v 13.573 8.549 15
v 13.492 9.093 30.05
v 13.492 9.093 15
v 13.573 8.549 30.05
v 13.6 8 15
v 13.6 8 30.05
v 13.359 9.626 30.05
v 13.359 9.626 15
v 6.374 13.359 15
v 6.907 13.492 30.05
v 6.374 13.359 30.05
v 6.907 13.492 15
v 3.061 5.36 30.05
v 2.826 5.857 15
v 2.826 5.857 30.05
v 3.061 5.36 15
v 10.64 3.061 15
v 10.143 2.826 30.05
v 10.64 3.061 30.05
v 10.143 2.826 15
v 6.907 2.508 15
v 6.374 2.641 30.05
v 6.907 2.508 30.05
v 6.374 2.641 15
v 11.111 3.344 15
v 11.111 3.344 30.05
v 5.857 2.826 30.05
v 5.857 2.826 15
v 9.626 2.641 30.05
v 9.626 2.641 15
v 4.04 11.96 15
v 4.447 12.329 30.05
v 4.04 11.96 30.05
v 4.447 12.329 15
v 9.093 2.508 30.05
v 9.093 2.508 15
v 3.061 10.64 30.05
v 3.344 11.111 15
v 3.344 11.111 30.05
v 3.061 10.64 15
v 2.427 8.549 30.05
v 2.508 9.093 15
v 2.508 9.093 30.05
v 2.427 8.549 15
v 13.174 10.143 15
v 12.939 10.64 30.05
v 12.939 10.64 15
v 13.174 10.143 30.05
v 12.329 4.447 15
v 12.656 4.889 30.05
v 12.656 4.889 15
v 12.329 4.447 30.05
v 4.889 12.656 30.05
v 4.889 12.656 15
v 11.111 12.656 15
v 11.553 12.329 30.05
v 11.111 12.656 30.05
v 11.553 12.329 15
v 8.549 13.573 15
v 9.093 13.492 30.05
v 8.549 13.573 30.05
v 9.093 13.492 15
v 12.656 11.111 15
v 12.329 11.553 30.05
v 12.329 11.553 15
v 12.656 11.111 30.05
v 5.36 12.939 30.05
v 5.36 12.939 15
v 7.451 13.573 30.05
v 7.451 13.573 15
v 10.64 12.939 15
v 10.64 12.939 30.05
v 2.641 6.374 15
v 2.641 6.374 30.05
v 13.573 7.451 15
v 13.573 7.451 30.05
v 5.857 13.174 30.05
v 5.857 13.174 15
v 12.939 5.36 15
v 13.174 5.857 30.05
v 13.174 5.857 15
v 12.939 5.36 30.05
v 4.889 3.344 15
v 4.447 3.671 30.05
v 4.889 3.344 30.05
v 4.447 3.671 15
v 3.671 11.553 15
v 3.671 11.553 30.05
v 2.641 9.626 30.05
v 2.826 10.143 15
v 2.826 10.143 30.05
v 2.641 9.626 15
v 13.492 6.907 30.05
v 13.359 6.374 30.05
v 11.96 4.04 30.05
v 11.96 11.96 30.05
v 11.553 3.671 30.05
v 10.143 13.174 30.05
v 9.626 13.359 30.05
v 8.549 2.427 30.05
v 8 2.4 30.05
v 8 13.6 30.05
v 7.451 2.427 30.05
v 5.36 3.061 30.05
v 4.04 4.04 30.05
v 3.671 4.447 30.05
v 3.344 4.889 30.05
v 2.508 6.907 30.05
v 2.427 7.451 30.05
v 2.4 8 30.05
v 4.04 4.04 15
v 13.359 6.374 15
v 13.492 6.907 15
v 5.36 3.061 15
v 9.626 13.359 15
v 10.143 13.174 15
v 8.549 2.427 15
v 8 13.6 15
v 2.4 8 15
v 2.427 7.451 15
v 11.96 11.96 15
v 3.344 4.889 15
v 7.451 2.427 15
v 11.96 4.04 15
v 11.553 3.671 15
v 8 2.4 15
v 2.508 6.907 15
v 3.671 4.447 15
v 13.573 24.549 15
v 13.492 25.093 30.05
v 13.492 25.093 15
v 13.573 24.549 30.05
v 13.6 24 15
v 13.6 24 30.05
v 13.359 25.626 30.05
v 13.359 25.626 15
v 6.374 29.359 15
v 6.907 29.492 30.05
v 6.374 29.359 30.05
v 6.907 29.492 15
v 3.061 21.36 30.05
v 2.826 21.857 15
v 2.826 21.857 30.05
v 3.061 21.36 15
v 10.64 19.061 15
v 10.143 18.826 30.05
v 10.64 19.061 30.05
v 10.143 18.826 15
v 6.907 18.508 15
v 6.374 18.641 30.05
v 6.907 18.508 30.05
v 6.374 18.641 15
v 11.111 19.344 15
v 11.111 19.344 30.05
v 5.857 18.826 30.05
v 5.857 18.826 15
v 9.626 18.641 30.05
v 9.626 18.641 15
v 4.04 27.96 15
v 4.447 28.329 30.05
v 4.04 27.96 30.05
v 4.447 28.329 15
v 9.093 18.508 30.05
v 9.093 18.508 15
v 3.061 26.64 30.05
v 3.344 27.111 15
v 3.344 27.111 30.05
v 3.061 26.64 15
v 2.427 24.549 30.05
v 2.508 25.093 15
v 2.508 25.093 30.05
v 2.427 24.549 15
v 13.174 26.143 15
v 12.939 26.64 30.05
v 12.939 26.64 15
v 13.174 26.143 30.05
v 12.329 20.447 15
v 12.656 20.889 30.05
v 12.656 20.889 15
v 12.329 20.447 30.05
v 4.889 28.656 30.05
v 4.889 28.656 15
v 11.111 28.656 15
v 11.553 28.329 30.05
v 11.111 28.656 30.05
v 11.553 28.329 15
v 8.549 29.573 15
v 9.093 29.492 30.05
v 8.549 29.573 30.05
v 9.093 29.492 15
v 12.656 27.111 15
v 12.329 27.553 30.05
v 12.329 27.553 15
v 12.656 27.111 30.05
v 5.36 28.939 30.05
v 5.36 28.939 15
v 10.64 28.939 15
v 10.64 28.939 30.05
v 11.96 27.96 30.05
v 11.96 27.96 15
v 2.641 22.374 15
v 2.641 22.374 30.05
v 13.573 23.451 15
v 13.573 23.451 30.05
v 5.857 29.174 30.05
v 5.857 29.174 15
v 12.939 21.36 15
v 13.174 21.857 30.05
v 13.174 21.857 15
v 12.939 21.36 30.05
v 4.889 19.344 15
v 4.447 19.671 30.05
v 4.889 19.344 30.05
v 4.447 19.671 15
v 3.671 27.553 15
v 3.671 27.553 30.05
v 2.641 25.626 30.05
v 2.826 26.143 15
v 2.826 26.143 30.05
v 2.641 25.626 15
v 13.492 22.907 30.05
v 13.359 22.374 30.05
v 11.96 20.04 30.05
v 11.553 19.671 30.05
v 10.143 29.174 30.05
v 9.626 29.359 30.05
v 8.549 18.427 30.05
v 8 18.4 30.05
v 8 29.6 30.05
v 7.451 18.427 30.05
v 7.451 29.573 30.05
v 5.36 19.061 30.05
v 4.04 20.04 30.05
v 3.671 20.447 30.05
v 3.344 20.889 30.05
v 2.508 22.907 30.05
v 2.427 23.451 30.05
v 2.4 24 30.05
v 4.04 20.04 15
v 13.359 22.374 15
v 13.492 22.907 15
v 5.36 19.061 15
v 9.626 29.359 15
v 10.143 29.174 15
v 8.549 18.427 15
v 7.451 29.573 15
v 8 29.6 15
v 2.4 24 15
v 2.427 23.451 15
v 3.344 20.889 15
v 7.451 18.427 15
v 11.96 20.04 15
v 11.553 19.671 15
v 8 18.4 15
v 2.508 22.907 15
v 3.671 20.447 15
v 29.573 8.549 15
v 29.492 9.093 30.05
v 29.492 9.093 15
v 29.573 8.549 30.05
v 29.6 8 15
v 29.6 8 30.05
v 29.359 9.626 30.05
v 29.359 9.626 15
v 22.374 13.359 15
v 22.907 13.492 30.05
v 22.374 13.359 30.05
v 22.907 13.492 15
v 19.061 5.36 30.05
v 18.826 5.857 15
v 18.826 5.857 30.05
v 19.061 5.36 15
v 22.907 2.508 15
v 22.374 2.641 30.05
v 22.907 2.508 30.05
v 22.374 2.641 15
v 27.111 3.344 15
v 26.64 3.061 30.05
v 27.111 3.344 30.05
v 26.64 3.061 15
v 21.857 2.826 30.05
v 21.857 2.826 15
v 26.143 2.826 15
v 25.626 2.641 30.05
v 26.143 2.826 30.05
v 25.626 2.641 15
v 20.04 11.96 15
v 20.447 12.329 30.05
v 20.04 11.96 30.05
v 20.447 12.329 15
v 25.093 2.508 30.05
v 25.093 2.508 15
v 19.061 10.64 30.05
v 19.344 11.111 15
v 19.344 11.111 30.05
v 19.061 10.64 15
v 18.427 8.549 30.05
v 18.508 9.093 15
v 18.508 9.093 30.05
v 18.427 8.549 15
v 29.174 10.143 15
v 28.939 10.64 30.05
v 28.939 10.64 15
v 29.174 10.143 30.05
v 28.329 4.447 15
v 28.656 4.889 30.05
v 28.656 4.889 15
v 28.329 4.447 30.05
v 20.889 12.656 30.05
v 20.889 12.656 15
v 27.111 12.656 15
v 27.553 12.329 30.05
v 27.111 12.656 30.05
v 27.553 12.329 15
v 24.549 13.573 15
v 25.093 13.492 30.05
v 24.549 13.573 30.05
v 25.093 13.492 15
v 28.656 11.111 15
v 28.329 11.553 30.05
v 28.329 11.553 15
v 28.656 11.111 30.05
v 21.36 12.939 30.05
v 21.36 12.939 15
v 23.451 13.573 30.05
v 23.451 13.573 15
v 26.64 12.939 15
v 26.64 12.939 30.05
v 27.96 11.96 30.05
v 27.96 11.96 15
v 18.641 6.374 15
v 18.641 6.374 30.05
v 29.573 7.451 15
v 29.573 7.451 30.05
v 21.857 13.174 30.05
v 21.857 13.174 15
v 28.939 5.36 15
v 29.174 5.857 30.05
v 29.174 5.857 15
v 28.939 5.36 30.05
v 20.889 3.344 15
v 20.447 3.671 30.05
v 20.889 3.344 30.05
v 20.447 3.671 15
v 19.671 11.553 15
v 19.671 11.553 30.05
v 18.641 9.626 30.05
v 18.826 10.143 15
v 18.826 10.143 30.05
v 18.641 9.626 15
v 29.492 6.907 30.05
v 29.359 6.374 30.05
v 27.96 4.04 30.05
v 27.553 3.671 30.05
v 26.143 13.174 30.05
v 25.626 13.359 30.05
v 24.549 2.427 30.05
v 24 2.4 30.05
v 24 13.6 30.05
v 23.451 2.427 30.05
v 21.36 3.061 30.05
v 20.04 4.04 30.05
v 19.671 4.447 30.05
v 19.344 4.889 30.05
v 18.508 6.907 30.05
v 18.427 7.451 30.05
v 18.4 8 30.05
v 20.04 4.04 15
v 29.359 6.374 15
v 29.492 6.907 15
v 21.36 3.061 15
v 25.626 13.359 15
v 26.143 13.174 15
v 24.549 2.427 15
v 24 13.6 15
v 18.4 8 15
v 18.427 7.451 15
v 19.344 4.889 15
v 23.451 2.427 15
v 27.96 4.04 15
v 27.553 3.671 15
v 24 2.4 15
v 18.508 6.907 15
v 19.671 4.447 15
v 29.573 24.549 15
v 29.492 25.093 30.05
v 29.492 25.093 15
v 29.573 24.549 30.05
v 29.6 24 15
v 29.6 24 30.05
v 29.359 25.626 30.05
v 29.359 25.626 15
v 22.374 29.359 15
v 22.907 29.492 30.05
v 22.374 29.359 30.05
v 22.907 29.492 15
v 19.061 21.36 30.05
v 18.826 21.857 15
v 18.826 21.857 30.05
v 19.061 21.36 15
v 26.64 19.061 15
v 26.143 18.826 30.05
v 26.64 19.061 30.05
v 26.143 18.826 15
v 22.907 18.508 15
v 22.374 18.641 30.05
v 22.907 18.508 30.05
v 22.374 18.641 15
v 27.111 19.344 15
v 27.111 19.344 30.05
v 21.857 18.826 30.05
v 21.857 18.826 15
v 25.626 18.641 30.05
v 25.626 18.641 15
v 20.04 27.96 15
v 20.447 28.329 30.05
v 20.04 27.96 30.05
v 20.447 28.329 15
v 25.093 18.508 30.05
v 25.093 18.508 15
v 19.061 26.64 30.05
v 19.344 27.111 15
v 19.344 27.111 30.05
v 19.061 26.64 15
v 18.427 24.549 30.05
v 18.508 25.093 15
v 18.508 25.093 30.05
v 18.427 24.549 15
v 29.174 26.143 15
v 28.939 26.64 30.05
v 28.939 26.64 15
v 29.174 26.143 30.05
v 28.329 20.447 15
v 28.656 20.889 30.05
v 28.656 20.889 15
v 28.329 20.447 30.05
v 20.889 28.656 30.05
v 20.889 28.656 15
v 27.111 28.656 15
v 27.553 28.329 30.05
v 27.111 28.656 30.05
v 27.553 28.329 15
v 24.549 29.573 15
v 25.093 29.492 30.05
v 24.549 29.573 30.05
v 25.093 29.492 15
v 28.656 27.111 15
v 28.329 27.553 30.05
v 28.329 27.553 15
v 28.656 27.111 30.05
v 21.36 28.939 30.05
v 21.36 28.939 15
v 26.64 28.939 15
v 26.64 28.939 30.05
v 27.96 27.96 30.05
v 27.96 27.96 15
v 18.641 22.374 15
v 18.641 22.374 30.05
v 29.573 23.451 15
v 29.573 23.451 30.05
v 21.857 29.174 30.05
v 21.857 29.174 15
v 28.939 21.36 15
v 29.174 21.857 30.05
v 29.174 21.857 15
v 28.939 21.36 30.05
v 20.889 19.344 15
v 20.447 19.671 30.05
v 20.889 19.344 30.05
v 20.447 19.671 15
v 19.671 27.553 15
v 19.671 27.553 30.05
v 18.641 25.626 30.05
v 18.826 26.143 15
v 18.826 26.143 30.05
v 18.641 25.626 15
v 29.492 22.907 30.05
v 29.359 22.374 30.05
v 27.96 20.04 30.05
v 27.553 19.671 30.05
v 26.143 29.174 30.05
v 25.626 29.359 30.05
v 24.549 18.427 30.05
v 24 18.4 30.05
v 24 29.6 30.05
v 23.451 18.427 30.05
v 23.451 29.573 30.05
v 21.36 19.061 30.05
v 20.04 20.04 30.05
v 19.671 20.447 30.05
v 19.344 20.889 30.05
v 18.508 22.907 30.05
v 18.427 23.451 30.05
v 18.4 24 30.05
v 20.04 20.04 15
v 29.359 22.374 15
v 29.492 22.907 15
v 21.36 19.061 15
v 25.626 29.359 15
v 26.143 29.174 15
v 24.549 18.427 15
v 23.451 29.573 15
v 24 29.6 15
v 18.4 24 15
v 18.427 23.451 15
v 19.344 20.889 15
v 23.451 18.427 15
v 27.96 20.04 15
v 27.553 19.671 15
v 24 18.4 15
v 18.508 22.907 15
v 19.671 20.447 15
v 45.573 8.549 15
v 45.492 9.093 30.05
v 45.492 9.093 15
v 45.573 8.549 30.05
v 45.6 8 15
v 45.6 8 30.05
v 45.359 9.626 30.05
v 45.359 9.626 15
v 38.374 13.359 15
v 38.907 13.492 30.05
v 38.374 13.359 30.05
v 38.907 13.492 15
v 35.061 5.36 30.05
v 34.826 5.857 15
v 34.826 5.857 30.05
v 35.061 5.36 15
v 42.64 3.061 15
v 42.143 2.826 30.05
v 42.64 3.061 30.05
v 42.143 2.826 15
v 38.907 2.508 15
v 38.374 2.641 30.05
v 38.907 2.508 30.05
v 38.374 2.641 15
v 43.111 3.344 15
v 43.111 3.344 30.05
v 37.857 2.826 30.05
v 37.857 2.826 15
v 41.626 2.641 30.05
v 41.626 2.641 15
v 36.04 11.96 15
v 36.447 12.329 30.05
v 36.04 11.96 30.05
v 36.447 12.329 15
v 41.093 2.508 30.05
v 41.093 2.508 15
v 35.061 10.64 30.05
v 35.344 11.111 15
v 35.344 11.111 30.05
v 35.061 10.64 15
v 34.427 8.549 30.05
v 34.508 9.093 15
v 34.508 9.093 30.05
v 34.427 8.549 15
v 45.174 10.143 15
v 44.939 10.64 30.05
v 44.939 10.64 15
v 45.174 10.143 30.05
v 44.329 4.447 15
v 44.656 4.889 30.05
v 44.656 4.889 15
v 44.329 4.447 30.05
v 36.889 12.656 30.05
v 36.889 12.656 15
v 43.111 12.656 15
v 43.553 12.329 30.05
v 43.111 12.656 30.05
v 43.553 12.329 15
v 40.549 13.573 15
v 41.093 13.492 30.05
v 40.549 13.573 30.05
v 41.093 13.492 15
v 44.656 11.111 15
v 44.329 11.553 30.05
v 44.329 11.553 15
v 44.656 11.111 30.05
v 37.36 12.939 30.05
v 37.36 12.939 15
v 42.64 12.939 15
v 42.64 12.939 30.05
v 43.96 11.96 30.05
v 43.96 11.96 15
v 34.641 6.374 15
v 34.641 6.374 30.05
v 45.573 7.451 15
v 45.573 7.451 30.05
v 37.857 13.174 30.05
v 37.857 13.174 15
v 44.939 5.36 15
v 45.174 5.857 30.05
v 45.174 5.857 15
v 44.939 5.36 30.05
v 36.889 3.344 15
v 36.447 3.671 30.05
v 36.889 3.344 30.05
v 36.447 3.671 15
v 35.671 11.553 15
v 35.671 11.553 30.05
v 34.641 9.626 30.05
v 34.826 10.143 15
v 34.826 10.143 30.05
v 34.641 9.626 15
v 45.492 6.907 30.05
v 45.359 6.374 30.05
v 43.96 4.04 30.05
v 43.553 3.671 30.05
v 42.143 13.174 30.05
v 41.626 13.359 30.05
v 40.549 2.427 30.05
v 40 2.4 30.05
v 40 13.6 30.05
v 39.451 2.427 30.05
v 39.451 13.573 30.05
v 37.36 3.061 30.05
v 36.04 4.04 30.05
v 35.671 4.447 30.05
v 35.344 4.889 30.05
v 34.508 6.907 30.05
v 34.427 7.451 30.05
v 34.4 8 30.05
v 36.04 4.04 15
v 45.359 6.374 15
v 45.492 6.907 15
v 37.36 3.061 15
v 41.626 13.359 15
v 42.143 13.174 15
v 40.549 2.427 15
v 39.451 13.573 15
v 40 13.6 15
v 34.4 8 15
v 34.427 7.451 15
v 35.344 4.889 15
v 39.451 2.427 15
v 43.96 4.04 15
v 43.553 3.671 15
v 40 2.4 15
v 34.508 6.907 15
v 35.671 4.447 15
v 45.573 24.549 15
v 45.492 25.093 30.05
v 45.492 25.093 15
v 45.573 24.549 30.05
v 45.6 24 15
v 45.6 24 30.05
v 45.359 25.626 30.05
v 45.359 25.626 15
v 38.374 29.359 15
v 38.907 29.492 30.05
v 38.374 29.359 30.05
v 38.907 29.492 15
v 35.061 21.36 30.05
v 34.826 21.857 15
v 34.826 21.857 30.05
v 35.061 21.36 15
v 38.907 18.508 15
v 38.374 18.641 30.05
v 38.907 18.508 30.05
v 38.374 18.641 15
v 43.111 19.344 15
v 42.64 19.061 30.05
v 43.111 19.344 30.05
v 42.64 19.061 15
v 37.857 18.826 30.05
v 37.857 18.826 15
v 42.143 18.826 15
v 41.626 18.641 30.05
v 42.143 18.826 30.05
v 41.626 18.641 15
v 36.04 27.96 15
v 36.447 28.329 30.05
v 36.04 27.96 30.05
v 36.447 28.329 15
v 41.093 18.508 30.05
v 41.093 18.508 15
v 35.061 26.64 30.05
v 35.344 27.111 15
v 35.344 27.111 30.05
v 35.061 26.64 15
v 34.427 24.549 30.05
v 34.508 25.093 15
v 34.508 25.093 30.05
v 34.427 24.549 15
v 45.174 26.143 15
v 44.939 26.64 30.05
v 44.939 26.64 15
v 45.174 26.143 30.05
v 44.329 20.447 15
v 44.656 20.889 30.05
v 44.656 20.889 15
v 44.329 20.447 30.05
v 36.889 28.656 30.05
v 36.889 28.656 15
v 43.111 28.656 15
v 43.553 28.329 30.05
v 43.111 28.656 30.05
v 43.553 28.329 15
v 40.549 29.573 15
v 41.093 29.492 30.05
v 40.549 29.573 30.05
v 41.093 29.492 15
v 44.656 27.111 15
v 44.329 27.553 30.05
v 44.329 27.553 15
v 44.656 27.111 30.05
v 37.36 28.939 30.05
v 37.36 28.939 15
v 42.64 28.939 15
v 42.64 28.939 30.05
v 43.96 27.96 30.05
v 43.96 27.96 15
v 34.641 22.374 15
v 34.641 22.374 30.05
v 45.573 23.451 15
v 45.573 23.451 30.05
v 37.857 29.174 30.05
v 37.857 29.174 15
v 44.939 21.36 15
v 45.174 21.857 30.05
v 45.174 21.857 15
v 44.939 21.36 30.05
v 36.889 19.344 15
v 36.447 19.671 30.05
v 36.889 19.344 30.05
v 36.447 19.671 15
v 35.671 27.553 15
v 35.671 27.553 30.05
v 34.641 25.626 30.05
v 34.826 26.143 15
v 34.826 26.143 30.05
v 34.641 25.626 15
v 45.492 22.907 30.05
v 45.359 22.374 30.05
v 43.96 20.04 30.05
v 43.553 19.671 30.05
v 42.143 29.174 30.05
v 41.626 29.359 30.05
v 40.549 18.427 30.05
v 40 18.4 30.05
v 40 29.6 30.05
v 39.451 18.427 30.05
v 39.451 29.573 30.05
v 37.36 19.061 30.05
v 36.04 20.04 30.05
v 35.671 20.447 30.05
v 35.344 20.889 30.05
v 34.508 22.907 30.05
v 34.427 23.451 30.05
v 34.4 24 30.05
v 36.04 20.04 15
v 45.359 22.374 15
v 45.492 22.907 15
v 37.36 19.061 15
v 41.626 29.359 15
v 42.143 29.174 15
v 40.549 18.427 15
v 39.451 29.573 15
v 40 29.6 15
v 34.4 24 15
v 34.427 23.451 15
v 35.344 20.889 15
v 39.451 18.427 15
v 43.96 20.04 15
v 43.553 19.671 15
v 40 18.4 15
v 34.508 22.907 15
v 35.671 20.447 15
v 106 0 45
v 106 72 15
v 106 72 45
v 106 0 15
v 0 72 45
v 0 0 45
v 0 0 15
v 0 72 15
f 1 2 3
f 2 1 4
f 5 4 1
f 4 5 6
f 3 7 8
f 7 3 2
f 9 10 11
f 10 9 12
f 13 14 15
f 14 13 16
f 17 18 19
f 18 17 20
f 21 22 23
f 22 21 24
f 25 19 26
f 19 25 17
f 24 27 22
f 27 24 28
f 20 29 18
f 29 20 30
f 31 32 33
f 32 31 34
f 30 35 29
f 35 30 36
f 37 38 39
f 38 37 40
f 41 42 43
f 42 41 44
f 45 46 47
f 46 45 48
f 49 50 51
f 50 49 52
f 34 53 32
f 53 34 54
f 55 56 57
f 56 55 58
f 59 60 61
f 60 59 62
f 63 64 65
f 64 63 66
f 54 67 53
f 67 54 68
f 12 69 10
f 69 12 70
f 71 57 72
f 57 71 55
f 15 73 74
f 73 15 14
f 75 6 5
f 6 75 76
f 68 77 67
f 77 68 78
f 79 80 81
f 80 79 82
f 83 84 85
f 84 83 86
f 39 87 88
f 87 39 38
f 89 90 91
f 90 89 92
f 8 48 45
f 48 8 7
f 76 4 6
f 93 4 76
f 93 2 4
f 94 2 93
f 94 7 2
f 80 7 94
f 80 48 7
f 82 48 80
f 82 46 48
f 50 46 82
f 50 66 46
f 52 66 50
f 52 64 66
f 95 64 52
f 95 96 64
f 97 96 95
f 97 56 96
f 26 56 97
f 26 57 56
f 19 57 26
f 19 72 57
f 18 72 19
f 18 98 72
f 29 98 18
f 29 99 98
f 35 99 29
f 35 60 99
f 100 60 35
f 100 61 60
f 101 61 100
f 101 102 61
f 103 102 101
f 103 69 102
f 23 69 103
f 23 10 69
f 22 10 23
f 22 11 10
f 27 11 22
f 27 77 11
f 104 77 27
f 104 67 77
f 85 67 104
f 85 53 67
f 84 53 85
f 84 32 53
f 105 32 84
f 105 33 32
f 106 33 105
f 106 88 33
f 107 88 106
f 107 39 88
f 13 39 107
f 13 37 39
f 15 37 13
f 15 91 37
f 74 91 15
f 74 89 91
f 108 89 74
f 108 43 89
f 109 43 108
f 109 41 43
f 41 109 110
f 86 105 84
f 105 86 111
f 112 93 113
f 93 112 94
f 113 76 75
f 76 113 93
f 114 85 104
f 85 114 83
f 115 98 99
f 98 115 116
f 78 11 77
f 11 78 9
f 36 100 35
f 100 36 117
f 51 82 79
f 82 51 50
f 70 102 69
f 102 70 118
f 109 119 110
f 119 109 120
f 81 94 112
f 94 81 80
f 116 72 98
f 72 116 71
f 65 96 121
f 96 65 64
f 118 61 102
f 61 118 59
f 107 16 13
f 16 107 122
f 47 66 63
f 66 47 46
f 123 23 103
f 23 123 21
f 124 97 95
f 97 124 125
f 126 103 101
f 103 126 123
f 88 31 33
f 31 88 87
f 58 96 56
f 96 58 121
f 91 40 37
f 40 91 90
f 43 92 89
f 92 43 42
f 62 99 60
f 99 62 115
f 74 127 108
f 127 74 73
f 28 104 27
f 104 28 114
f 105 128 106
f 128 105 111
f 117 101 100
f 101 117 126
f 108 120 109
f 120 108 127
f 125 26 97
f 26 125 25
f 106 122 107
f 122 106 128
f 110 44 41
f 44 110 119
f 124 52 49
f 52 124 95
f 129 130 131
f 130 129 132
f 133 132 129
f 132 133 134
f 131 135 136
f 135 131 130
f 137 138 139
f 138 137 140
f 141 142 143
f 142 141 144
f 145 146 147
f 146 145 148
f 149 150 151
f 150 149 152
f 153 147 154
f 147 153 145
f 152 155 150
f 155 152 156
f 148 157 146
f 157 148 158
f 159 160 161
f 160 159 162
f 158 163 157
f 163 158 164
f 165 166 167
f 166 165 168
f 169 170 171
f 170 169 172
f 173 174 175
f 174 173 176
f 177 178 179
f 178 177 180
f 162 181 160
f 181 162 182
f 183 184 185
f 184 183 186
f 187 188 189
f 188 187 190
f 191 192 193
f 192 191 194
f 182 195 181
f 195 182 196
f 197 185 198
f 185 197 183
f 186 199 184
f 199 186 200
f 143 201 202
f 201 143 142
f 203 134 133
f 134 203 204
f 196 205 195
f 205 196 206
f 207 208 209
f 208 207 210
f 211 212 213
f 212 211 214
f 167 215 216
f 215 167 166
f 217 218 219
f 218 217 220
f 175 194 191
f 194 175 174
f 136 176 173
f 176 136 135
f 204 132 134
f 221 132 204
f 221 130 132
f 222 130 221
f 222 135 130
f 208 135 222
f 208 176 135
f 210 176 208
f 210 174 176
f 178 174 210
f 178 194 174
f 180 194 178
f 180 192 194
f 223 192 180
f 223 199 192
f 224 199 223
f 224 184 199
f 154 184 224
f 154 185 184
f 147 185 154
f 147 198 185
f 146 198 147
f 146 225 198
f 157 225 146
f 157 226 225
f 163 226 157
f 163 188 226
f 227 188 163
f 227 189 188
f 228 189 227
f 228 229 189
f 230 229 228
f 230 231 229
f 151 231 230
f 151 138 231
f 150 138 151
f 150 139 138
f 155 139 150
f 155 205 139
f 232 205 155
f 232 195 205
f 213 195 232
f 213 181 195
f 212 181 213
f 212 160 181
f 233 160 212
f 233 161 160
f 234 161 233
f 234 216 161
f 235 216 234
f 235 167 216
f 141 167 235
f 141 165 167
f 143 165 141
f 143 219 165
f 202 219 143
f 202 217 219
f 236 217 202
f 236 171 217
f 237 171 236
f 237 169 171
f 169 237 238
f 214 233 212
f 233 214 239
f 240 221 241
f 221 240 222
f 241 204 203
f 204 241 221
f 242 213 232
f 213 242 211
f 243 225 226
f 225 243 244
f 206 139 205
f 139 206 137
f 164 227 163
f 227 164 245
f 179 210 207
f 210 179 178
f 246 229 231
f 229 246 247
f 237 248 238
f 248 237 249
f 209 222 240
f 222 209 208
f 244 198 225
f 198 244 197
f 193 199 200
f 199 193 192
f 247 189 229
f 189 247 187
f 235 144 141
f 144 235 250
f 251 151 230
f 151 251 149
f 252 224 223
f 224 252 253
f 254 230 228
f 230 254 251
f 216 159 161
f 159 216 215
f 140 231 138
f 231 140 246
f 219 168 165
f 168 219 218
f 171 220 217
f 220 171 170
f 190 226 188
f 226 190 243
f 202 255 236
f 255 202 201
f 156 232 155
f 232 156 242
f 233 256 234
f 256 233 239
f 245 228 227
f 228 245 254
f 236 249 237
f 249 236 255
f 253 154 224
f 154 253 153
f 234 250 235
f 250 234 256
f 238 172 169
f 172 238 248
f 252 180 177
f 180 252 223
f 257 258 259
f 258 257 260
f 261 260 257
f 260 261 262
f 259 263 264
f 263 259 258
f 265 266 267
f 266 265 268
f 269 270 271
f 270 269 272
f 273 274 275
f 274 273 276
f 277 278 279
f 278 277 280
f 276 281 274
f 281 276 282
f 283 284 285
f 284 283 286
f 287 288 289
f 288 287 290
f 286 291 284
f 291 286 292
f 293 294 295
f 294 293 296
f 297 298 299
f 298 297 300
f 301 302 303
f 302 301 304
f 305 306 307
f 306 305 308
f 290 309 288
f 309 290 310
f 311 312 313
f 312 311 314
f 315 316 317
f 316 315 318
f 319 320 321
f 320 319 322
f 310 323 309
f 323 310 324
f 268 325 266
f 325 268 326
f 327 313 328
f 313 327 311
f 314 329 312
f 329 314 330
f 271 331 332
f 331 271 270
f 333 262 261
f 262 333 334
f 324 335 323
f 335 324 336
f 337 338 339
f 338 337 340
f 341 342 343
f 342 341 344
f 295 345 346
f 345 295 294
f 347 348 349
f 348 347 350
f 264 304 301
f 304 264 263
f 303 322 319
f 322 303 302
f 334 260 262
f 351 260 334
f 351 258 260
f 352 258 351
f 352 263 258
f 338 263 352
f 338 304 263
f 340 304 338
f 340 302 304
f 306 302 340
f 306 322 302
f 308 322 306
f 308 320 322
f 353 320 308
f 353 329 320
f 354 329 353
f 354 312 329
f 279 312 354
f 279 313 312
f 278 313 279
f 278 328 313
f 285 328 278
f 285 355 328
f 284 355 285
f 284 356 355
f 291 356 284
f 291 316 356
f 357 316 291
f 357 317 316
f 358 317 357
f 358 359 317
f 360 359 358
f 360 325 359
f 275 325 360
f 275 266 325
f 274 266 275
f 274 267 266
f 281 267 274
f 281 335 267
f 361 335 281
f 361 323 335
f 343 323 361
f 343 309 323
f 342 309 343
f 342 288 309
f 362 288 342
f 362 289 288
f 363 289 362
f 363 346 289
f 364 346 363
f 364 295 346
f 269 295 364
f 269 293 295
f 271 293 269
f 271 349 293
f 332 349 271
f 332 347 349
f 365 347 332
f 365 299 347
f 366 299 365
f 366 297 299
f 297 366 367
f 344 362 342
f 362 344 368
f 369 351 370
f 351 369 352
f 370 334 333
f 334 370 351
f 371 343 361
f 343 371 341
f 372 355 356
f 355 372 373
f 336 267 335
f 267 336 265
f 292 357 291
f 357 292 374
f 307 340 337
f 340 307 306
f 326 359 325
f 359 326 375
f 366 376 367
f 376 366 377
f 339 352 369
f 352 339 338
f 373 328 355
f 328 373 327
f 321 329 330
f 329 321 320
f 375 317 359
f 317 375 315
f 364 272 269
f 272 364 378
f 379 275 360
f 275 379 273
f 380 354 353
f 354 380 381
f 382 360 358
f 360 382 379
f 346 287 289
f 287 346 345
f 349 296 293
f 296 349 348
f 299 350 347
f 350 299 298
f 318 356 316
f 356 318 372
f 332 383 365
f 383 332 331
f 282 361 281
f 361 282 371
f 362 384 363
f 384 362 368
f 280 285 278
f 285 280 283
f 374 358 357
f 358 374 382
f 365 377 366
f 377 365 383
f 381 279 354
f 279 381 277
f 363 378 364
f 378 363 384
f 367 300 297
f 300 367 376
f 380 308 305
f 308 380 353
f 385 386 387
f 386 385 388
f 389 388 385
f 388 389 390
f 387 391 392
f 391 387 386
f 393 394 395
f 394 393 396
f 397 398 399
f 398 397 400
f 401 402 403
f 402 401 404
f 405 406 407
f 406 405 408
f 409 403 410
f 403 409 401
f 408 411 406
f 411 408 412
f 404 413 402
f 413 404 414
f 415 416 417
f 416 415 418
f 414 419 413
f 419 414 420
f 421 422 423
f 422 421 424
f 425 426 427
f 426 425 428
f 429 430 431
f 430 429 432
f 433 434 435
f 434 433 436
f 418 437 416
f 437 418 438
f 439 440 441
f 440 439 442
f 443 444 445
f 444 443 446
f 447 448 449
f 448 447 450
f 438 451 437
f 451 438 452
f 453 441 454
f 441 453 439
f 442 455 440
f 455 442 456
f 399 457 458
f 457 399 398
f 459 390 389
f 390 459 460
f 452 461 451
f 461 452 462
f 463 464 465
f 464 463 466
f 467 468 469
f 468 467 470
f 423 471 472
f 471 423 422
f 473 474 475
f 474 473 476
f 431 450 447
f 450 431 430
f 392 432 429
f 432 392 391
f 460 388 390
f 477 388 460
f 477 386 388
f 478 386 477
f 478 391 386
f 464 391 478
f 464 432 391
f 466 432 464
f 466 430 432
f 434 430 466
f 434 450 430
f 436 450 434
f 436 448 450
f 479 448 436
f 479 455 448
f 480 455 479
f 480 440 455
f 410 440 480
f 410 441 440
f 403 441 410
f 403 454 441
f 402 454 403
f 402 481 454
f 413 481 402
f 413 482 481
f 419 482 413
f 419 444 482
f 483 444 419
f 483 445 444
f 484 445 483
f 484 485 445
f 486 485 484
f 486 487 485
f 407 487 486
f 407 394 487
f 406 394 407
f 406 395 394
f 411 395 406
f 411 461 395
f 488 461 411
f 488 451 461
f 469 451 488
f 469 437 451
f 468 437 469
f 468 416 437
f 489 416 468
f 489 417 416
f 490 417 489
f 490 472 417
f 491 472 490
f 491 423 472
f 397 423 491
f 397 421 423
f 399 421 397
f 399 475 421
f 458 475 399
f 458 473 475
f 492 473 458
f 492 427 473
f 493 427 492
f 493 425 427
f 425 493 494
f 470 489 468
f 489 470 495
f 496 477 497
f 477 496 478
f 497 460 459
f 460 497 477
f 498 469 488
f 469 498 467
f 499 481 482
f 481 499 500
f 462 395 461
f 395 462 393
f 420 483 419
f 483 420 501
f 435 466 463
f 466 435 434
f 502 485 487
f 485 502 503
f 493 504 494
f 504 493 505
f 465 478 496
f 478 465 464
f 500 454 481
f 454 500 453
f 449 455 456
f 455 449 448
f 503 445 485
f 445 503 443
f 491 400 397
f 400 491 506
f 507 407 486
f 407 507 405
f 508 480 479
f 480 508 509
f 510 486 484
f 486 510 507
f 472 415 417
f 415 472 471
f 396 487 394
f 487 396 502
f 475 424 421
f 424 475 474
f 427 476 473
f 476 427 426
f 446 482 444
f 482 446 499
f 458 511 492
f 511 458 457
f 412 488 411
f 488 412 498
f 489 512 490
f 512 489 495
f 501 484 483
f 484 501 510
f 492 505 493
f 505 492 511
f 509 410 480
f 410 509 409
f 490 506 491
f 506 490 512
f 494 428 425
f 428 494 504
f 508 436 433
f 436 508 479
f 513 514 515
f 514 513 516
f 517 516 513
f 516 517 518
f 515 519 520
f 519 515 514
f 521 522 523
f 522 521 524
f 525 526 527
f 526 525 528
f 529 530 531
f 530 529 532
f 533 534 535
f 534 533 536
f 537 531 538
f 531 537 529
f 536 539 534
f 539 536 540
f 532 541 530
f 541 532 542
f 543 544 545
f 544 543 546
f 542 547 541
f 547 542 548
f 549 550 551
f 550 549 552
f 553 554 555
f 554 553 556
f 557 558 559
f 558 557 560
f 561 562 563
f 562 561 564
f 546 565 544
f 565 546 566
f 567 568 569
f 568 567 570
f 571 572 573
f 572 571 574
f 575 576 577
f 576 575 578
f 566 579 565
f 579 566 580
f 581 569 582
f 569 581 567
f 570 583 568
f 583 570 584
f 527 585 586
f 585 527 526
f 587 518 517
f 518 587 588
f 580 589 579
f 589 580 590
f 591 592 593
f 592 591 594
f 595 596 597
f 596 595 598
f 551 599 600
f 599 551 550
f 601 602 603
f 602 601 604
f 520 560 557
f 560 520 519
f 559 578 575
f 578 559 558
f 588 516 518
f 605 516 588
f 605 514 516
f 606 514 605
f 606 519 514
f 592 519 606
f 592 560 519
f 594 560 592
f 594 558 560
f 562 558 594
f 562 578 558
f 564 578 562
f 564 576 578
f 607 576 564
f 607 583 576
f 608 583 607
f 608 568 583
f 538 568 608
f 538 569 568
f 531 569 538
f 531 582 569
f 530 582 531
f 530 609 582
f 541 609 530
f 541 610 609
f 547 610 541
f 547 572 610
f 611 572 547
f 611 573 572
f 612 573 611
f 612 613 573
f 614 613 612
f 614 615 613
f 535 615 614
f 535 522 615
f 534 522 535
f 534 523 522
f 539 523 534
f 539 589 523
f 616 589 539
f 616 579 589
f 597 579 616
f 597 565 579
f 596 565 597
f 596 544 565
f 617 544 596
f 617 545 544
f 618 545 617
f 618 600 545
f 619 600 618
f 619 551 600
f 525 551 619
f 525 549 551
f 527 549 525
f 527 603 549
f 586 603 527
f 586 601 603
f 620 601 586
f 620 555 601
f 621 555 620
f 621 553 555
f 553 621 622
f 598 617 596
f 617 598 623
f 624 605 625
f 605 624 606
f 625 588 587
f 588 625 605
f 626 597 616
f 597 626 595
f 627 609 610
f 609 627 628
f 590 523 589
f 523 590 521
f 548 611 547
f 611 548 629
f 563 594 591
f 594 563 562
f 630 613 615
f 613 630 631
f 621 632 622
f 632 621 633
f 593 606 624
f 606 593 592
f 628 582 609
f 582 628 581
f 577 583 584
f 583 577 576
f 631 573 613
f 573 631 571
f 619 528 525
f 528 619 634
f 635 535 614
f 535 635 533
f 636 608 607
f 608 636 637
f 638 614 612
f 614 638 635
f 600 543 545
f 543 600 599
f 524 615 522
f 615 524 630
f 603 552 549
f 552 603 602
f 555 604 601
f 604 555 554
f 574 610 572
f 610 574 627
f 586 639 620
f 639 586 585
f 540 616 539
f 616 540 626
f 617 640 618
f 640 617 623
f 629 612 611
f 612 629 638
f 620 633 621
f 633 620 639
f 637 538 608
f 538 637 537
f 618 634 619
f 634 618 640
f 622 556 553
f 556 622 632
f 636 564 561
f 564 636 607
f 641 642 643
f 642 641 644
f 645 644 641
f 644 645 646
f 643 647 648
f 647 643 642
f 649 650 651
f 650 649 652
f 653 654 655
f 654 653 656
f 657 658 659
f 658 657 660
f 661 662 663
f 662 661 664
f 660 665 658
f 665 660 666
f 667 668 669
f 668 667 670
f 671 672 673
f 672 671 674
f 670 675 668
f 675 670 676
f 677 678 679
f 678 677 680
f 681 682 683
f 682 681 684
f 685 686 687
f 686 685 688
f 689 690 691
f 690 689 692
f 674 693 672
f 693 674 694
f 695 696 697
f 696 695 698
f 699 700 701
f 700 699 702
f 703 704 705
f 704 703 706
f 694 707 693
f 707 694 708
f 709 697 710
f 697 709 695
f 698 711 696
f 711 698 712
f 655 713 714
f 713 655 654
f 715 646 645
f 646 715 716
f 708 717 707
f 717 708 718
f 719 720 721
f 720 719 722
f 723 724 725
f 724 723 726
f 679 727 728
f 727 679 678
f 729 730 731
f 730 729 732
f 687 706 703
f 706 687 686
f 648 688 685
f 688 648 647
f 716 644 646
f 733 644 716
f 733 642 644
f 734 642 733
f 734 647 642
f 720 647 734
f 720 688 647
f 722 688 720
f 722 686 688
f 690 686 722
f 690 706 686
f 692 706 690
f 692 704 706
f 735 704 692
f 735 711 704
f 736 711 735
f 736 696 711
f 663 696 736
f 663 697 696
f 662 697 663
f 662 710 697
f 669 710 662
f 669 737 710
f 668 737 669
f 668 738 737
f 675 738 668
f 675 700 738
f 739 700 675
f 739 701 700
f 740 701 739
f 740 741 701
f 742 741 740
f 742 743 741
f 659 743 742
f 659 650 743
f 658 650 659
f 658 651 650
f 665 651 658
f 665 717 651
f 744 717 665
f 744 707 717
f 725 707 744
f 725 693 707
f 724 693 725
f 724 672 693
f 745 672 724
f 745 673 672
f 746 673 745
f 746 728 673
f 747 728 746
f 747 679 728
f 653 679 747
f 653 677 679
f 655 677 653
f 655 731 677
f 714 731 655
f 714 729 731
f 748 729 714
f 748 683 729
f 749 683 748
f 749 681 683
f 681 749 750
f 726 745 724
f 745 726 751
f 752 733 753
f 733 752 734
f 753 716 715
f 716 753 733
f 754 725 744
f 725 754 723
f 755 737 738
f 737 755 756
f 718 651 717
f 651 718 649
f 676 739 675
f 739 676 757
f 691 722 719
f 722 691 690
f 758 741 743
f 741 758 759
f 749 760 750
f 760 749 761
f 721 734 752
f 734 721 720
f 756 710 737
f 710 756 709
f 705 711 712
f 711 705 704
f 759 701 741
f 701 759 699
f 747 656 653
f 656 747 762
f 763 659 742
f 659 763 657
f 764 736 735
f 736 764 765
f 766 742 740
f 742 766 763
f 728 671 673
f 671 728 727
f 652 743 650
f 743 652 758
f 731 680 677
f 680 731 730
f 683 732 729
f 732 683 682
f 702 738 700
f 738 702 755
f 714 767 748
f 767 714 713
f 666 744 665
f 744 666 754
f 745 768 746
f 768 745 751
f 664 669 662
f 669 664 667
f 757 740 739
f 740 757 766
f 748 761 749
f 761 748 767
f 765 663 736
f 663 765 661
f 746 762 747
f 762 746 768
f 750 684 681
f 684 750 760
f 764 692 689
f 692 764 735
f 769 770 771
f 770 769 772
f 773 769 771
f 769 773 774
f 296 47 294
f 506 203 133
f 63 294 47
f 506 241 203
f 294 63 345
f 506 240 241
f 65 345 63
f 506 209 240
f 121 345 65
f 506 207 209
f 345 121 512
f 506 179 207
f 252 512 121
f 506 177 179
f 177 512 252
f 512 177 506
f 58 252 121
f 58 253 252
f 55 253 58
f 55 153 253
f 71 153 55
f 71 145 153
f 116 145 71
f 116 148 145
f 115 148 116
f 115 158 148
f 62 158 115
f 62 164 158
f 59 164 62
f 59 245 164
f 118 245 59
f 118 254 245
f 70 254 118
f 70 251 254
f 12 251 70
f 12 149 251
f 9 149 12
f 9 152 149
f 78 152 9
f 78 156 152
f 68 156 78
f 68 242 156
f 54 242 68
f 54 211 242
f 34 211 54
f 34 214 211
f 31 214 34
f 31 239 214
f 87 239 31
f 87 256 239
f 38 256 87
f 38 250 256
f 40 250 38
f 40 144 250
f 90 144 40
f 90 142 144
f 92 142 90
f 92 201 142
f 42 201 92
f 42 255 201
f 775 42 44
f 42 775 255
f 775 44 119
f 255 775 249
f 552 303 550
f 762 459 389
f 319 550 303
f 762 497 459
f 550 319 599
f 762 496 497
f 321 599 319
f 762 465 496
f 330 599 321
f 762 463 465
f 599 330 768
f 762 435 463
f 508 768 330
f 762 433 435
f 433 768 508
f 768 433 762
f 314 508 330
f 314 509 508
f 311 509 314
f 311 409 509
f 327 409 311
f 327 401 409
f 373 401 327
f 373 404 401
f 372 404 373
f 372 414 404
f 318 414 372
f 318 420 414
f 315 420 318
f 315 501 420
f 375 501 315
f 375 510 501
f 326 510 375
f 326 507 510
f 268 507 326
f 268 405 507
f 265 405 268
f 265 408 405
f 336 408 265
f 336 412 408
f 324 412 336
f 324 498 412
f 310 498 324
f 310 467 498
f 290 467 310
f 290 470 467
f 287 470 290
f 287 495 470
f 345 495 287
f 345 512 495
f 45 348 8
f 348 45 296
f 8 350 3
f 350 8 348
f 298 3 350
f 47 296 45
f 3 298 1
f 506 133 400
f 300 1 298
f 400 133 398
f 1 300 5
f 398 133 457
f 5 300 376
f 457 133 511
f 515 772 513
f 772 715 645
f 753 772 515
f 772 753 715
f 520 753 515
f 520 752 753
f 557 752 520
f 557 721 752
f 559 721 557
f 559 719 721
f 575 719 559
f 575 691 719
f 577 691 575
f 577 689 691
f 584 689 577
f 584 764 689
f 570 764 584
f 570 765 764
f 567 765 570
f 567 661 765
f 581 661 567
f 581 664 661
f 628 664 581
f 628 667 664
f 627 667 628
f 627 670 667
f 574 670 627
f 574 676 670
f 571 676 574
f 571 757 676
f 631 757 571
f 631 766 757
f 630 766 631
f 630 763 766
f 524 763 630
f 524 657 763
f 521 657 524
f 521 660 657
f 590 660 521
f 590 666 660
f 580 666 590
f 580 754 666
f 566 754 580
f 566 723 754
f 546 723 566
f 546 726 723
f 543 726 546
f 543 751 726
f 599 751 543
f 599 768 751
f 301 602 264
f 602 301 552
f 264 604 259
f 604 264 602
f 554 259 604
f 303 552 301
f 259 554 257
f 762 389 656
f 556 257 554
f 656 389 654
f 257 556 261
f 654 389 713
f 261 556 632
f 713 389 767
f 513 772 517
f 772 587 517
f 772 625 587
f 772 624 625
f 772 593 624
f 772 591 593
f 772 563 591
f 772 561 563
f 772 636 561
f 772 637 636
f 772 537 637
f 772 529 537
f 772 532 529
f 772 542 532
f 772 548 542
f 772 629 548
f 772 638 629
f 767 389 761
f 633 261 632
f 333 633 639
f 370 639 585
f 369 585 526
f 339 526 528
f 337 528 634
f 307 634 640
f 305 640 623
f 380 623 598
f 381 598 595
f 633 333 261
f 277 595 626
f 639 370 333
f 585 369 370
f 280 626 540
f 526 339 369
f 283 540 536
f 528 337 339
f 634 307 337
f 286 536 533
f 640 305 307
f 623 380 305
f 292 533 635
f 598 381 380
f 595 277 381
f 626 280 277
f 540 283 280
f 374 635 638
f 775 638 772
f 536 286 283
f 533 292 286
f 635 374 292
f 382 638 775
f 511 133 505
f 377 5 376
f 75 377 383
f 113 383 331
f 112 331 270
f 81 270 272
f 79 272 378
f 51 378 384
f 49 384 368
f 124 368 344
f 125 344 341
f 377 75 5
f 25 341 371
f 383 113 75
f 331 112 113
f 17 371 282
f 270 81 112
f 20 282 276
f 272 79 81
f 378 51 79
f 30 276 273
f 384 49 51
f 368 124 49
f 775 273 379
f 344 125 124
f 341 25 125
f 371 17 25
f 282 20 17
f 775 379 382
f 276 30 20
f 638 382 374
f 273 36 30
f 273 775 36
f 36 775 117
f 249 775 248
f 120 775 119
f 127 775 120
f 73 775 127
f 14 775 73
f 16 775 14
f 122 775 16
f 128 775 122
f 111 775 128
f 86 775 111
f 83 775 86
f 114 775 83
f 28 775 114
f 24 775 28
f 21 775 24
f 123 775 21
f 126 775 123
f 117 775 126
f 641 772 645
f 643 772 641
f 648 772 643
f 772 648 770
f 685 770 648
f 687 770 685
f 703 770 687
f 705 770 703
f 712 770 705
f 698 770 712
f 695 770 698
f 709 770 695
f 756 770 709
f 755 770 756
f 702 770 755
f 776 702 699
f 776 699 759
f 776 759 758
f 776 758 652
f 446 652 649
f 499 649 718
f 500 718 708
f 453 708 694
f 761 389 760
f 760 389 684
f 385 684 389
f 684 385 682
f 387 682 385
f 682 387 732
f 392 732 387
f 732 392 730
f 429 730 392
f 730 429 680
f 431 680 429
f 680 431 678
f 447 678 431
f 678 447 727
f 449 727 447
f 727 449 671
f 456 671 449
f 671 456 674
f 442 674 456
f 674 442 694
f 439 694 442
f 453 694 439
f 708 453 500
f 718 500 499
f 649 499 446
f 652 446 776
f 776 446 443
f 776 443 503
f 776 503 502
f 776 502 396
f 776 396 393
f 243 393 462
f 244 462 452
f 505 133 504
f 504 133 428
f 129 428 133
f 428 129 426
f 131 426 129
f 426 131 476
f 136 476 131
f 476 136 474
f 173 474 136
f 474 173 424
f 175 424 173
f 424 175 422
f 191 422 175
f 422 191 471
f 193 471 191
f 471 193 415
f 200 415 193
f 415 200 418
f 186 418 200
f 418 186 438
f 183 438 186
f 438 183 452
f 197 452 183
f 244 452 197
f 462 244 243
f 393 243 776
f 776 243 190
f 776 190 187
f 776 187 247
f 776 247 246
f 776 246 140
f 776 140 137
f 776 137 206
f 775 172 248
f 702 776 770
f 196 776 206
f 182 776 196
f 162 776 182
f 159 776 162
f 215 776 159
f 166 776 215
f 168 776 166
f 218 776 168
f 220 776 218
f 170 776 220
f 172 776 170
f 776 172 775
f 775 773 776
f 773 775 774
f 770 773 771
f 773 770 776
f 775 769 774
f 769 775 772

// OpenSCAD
// Dimensions for the bench rack
block_len = 106;      // Length of the block along X axis (mm)
block_wid = 72;        // Width of the block along Y axis (mm)
block_h = 30;          // Height of the block along Z axis (mm)

// Hole specifications
hole_dia = 11.2;       // Diameter of the holes (mm)
hole_depth = 25;      // Depth of the holes (mm)
hole_spacing = 16;     // Center-to-center spacing between holes (mm)
hole_cols = 6;         // Number of holes along X axis
hole_rows = 4;         // Number of holes along Y axis

// Calculated offsets and positions
// Center of the hole grid relative to the block center
hole_center_offset_x = (hole_cols - 1) * hole_spacing / 2;
hole_center_offset_y = (hole_rows - 1) * hole_spacing / 2;

// Position of the top of the hole cylinder relative to the block top
// We need to extend past the top face (Z=30) and the bottom face of the hole (Z=5)
// to satisfy the rule of extending 0.01-1 mm past faces.
// Block top is at Z=30. Hole top is at Z=30.
// Block bottom is at Z=0. Hole bottom is at Z=5.
// Cylinder Z start: 5 - 0.05 = 4.95
// Cylinder Z end: 30 + 0.05 = 30.05
// Cylinder height: 25.1
hole_z_start = block_h - hole_depth - 0.05;
hole_cyl_height = hole_depth + 0.1;

// Block center position (Z=15 to center the block on Z=0 to Z=30)
block_z_center = block_h / 2;

// Set resolution for curved shapes
$fn = 64;

// Main geometry
difference() {
    // The solid base block
    // Centered on X/Y, resting on XY plane (Z=0)
    translate([0, 0, block_z_center]) {
        cube([block_len, block_wid, block_h]);
    }

    // The holes
    for (i = [0:hole_cols - 1]) {
        for (j = [0:hole_rows - 1]) {
            // Calculate hole center positions
            x_pos = -hole_center_offset_x + i * hole_spacing;
            y_pos = -hole_center_offset_y + j * hole_spacing;

            // Create the hole cylinder
            // Extends slightly past the top face (Z=30) and the bottom face of the hole (Z=5)
            translate([x_pos, y_pos, hole_z_start]) {
                cylinder(h=hole_cyl_height, d=hole_dia, $fn=64);
            }
        }
    }
}
